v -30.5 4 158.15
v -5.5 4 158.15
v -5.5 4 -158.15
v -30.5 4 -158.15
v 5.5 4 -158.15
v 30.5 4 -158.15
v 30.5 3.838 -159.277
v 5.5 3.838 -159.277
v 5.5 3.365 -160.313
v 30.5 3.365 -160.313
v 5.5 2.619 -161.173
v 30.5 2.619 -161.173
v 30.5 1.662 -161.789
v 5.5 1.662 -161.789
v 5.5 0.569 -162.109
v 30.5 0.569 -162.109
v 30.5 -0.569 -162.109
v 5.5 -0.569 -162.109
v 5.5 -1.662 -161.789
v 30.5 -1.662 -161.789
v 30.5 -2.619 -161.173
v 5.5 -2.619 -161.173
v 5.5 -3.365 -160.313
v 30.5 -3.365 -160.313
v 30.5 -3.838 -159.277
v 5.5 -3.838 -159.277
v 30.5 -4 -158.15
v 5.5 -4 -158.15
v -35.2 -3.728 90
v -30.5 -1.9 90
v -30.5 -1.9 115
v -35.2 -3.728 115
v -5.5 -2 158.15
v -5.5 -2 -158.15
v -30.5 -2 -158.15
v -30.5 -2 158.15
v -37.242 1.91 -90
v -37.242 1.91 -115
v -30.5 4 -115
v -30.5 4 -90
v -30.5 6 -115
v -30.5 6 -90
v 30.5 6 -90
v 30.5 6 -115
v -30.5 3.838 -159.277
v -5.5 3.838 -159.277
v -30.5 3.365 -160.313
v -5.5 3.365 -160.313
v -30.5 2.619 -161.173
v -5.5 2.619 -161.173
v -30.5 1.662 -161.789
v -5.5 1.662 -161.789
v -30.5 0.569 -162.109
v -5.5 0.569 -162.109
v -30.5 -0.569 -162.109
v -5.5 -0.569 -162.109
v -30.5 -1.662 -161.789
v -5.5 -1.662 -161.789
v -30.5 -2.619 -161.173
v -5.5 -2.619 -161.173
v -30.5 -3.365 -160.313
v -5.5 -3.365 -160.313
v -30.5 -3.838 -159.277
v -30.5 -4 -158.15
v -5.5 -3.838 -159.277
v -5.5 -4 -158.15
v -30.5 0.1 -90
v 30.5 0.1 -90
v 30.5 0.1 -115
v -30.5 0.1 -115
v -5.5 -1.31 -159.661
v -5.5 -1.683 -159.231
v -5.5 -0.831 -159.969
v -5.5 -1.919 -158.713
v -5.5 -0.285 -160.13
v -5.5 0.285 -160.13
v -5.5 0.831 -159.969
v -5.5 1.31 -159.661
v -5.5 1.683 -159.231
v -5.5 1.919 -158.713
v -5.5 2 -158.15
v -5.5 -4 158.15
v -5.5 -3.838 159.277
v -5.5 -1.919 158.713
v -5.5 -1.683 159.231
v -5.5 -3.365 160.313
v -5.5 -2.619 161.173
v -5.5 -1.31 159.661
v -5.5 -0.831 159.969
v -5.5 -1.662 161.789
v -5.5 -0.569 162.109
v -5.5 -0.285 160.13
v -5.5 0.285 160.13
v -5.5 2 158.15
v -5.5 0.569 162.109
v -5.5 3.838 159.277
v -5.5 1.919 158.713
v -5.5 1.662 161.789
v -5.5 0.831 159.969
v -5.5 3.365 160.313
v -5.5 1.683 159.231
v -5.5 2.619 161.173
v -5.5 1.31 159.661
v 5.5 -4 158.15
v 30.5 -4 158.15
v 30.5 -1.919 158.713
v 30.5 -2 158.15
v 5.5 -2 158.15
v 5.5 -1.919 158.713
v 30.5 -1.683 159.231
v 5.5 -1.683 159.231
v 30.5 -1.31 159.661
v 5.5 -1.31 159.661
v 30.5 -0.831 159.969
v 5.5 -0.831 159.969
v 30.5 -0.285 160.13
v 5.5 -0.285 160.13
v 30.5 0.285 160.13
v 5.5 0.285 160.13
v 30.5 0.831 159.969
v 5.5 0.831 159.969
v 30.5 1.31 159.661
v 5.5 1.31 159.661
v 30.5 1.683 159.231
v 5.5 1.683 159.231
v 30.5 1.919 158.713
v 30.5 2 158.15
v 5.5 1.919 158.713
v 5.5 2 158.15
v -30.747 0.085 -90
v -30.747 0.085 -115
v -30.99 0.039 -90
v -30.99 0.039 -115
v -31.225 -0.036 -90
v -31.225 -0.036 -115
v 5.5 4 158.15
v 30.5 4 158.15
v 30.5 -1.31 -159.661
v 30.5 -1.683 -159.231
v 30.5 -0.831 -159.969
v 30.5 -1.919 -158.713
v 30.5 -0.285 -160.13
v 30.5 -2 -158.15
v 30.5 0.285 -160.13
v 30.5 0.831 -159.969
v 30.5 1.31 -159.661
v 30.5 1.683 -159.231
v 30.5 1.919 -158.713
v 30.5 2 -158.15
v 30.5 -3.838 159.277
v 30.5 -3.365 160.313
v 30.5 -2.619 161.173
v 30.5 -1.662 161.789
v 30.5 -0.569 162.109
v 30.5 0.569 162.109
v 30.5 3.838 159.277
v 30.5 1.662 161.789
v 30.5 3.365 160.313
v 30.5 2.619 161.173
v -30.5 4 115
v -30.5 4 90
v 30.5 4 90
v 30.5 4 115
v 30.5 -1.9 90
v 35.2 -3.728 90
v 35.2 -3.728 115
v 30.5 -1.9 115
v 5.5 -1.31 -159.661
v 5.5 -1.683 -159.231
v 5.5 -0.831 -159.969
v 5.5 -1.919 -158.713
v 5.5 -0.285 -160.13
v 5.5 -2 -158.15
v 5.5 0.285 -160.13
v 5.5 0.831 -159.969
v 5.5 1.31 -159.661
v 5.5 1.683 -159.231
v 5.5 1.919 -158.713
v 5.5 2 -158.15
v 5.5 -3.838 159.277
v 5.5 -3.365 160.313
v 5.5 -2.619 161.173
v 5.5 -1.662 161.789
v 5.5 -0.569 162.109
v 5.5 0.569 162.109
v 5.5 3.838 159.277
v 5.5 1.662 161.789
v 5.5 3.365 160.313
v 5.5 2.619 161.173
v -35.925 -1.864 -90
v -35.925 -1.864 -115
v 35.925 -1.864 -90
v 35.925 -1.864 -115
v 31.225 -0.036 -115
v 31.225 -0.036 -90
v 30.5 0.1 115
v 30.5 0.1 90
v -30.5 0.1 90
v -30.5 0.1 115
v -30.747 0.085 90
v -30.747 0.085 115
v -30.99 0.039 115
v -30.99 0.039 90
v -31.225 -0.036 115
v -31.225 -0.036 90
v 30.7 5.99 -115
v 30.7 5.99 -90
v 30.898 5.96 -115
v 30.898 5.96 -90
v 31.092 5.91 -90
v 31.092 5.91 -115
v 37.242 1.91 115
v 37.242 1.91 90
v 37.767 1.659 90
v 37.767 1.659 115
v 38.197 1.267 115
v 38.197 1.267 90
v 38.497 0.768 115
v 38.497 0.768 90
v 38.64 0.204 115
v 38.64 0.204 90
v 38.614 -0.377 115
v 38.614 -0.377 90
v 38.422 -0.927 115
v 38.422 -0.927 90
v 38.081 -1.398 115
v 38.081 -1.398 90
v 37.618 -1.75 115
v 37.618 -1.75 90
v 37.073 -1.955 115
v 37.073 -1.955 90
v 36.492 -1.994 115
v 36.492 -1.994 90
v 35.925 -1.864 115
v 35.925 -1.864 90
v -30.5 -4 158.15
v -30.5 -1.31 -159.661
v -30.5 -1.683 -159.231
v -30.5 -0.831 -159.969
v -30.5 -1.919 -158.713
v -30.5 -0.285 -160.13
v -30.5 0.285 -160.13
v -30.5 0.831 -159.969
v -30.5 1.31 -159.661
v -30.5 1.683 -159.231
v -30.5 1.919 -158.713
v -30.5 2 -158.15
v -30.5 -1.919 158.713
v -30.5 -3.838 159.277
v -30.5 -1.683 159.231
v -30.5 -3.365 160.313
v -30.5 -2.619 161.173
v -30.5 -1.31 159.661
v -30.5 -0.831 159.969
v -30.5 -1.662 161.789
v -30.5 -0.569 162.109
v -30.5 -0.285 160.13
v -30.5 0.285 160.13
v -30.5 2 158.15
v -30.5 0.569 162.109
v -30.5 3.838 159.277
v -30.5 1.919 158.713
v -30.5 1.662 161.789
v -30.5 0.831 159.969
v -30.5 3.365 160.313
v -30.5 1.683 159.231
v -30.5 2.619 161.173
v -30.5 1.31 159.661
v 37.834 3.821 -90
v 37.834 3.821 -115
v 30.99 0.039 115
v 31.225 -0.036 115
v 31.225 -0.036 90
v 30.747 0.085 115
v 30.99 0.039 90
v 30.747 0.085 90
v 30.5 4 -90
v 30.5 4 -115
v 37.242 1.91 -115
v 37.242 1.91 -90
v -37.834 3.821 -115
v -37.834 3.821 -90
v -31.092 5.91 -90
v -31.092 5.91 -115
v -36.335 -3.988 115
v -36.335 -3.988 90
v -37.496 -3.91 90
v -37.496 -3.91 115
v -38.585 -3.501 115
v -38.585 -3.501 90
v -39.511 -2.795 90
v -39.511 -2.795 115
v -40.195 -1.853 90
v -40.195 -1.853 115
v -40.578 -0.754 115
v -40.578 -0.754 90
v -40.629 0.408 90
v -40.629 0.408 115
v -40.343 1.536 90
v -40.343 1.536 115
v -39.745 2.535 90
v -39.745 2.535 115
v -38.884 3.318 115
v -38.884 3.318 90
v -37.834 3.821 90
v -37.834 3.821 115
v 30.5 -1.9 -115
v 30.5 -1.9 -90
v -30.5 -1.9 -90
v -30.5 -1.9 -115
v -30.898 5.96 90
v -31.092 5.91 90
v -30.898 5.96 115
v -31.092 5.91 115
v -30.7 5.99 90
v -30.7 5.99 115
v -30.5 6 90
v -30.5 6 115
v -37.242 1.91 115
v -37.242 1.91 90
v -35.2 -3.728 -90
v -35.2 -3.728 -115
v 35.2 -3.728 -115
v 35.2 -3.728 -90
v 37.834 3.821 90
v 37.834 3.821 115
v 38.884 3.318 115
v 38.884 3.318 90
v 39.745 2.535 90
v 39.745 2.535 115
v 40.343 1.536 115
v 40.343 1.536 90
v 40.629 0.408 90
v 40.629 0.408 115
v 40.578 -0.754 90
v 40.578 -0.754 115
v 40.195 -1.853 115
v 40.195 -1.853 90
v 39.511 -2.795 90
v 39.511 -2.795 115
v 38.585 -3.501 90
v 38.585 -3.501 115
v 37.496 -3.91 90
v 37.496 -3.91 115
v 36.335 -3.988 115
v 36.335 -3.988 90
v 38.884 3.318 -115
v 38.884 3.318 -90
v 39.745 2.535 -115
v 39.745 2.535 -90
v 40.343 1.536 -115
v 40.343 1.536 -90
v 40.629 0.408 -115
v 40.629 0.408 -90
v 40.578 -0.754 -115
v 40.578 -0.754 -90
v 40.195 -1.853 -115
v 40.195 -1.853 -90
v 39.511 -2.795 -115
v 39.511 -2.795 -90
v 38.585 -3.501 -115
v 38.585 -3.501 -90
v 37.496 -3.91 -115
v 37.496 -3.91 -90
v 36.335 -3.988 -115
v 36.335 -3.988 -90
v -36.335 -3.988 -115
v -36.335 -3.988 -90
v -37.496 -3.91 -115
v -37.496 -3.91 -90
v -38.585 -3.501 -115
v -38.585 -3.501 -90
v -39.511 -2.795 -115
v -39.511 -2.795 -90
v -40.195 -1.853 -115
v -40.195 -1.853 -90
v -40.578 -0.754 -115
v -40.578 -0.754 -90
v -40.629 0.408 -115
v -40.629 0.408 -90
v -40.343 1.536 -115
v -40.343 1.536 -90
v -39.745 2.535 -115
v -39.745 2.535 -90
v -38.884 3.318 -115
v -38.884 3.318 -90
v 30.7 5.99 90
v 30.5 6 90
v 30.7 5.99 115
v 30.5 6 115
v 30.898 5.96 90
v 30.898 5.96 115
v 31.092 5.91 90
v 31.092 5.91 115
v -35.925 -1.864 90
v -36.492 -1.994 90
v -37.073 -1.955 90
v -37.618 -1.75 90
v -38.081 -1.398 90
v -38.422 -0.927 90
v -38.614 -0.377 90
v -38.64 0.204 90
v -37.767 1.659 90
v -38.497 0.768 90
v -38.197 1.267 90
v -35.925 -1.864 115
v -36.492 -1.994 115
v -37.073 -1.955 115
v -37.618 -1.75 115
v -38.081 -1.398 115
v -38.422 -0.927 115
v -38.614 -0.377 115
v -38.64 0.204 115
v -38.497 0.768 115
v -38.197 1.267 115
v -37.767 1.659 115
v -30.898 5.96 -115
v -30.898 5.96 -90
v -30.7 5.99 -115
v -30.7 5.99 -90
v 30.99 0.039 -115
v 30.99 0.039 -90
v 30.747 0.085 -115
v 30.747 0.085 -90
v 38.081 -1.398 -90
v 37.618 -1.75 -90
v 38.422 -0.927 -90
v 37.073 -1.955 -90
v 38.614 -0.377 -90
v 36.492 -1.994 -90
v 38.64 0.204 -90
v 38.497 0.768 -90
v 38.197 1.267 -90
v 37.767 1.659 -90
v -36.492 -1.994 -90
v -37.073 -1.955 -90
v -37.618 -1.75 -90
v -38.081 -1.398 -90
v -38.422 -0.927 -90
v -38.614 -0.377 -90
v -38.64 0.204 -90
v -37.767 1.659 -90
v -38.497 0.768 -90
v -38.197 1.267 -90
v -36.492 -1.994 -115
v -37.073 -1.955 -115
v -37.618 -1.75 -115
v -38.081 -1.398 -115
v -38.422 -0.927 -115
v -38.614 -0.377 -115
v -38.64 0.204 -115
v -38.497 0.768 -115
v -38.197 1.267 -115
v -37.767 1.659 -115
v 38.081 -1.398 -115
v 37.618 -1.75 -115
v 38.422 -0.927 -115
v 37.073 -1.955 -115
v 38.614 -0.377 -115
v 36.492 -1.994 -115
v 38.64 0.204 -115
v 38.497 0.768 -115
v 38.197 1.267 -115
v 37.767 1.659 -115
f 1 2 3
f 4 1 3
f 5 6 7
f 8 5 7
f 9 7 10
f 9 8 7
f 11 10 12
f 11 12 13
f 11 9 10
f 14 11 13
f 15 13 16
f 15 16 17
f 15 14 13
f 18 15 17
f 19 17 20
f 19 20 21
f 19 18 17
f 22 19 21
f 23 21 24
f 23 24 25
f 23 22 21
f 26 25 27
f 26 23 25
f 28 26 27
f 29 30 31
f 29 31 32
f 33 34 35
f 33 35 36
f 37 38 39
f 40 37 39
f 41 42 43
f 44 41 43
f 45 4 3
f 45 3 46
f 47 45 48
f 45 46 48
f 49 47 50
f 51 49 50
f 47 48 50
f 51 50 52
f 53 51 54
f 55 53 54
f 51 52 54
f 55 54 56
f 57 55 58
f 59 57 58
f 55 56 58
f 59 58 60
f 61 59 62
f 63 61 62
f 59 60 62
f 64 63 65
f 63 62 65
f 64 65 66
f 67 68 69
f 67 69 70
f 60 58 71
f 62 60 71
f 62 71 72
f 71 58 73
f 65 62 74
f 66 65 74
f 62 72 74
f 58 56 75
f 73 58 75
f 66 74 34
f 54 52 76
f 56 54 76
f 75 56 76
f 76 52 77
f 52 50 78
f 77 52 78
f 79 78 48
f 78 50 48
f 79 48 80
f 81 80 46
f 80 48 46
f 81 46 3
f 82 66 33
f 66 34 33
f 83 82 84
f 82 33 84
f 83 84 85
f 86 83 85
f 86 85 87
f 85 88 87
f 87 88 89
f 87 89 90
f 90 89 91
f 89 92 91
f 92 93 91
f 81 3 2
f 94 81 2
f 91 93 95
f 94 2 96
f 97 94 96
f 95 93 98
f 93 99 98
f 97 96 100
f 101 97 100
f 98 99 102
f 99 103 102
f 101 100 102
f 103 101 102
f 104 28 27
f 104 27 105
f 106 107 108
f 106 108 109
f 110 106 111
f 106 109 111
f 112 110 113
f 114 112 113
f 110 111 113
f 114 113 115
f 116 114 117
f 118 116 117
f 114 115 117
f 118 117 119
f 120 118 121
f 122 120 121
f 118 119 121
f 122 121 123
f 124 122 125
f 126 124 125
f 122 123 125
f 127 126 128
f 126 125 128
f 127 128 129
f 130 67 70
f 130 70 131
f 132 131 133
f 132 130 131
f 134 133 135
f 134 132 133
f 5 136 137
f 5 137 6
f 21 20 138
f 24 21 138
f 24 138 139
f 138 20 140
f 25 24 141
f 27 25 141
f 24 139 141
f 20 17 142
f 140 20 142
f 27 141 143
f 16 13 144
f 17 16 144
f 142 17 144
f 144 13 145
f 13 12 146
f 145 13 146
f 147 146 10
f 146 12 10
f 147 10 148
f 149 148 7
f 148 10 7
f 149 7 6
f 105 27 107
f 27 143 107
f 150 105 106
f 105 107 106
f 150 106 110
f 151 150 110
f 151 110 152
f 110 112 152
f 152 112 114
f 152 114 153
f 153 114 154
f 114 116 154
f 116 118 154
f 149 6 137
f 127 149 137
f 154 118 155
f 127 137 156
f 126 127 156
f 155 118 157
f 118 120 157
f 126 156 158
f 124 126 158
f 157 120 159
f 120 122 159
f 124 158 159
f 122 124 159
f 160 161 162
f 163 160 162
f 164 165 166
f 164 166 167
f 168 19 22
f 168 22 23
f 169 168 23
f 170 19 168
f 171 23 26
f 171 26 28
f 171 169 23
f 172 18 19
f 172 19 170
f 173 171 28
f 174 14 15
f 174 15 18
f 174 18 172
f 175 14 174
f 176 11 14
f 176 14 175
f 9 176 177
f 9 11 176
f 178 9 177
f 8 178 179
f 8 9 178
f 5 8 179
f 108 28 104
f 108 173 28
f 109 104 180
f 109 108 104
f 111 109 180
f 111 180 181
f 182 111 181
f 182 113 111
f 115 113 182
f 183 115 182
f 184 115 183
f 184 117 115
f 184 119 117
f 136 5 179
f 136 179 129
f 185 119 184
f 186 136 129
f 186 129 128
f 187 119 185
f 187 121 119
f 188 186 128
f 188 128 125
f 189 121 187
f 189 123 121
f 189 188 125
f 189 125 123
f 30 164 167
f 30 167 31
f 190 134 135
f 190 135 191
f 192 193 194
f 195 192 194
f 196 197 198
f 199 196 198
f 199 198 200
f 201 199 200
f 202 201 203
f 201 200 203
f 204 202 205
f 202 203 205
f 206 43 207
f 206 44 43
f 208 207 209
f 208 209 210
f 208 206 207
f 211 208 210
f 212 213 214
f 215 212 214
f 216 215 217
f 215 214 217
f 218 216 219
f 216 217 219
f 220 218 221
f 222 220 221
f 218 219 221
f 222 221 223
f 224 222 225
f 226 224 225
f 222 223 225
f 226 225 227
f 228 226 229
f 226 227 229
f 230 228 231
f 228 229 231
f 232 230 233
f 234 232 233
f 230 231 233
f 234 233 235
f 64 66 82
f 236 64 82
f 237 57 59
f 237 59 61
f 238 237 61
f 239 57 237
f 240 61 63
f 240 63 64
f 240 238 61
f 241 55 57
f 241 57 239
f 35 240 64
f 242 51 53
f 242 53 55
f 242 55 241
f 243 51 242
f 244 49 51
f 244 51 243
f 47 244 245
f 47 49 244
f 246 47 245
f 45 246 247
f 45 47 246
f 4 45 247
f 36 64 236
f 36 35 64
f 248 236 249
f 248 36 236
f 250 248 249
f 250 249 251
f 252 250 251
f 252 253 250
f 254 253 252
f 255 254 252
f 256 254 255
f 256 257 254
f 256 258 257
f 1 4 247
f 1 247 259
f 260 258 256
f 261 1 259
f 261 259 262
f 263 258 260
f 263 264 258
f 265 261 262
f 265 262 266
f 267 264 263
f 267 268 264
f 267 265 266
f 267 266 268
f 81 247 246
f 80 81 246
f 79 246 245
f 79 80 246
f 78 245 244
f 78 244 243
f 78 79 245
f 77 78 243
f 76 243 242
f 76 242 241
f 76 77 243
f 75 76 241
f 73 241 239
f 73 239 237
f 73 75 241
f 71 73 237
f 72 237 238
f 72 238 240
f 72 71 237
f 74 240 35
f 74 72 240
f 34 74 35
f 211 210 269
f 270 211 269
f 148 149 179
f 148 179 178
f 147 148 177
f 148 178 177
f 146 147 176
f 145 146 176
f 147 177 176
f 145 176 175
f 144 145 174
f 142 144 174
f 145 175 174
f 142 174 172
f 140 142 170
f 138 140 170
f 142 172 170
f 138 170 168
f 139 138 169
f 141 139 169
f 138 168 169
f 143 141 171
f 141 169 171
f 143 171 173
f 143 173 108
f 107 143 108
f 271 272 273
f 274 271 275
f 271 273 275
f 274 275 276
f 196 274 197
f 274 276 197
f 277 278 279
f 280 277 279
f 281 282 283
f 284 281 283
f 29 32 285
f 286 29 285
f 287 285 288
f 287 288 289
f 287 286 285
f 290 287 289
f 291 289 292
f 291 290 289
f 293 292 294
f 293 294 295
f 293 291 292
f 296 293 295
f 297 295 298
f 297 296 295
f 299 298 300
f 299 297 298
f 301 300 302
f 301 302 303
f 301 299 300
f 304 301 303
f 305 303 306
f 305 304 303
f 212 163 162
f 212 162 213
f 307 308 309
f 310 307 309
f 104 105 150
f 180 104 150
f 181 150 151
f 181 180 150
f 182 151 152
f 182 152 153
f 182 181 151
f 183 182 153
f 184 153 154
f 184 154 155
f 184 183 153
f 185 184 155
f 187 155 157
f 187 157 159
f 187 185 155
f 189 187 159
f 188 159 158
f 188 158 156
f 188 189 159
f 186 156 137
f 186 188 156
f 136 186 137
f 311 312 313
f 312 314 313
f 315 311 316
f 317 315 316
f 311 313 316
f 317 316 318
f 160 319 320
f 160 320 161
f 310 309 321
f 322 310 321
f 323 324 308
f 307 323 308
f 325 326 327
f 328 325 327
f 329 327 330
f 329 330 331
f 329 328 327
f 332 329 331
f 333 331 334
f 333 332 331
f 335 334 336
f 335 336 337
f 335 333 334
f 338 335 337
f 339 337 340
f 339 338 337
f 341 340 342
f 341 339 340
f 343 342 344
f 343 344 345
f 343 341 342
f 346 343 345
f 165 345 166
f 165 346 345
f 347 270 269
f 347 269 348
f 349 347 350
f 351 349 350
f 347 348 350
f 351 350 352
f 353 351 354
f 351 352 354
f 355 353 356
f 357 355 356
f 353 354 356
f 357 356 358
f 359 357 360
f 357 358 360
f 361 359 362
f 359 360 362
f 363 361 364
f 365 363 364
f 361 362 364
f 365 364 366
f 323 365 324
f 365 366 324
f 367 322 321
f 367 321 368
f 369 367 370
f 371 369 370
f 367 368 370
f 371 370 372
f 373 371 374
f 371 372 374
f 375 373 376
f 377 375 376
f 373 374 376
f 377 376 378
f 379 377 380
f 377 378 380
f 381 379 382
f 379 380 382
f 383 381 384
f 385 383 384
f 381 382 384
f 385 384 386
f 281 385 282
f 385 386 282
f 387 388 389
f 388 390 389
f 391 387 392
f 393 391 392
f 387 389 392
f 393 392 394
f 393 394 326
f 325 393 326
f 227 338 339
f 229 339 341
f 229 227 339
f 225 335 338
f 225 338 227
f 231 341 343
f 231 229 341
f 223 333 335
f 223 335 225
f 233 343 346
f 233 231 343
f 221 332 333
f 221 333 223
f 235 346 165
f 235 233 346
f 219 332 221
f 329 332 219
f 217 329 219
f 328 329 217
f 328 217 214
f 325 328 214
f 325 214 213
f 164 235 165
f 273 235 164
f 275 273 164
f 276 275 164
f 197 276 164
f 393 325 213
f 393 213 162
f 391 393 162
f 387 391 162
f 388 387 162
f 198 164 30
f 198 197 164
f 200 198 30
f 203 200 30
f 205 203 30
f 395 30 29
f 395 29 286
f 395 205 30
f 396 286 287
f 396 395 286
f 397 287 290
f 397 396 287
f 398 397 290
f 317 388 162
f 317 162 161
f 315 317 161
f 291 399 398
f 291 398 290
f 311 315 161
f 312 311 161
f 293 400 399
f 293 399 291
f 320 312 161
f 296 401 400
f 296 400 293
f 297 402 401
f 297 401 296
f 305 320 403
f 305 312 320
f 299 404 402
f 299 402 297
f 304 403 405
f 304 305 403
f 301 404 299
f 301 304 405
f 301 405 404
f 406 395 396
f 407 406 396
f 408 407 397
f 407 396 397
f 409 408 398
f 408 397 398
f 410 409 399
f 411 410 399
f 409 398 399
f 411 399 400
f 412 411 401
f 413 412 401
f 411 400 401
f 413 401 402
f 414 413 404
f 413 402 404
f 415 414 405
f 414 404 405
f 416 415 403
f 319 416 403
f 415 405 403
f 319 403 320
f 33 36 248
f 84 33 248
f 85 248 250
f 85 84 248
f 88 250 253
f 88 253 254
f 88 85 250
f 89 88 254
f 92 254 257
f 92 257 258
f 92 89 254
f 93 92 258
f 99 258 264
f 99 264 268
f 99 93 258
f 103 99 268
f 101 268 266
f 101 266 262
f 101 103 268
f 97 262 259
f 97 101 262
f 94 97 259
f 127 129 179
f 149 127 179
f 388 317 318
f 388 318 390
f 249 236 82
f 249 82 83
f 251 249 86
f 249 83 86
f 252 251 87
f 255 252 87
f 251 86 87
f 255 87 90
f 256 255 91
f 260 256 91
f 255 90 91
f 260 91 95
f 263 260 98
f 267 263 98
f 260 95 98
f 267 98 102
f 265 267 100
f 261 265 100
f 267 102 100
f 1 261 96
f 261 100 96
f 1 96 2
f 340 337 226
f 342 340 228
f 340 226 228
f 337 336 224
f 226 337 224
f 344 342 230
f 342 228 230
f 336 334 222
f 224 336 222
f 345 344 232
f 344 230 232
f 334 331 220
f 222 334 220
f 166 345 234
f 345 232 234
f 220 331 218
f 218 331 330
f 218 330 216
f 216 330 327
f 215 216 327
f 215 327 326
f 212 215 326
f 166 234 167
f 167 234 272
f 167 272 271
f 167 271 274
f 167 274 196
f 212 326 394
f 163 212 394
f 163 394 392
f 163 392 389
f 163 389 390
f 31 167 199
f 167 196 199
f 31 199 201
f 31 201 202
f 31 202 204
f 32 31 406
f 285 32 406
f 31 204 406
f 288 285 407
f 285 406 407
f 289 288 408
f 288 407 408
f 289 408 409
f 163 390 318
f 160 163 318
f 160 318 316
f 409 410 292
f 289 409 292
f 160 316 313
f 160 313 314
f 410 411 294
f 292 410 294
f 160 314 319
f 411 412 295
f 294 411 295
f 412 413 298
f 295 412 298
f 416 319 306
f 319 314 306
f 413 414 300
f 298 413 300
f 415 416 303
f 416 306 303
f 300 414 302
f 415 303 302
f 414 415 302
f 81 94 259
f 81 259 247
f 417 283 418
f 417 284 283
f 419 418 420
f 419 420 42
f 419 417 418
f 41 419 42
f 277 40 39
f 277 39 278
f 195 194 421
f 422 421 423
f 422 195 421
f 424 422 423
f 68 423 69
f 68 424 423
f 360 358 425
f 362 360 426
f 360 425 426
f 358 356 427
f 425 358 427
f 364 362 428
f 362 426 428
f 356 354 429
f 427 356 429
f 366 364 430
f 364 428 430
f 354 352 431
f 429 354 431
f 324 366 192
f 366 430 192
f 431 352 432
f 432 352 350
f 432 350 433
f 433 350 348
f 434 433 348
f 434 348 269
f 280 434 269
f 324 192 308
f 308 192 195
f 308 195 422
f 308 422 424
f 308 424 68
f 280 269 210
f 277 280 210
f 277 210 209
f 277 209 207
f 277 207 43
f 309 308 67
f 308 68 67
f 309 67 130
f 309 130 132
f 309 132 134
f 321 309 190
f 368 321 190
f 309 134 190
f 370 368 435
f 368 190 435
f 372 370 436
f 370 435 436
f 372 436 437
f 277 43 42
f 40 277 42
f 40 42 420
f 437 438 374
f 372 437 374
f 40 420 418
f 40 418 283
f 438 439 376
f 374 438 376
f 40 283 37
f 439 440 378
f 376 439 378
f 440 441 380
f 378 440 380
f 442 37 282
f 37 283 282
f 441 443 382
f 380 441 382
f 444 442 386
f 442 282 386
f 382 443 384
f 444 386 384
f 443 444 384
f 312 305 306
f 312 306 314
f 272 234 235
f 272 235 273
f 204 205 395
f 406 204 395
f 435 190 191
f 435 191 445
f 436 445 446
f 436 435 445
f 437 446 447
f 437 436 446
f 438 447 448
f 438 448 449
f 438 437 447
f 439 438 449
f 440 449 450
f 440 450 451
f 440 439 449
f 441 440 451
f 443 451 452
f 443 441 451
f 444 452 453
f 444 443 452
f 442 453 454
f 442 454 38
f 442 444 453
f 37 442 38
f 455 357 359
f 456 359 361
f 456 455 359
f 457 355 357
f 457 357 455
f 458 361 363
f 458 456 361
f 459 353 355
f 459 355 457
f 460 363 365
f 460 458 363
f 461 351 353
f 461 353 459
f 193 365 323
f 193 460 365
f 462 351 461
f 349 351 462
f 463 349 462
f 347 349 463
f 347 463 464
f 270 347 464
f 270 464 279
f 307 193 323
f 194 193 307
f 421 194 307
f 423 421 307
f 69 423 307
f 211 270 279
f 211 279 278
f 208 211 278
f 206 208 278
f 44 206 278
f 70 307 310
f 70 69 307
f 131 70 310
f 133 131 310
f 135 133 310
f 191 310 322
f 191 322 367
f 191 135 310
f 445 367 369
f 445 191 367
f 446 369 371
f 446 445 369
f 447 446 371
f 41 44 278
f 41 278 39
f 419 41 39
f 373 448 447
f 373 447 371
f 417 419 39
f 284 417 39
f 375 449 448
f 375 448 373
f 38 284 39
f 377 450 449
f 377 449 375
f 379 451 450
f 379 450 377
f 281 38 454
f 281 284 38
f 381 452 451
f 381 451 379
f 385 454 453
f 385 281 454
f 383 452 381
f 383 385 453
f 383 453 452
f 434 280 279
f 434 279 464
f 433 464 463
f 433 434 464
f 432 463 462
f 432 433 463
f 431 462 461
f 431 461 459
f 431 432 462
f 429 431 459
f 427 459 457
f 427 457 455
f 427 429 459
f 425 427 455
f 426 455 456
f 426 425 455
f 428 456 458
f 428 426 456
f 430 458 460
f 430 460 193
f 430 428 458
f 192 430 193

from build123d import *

# Parameters (mm, degrees)
EXTRUDE_THIN1_START = 5.5
EXTRUDE_THIN1_DEPTH = 25
EXTRUDE_THIN2_START = 90
EXTRUDE_THIN2_DEPTH = 25
FILLET1_R           = 2


with BuildPart() as part:
    # Sketch1 → Extrude-Thin1 (new body)
    with BuildSketch(Plane(origin=(0, 0, 0), x_dir=(0, 0, -1), z_dir=(1, 0, 0)).offset(EXTRUDE_THIN1_START)):
        with BuildLine():
            Line((158.15, -4), (-158.15, -4))
            ThreePointArc((-158.15, -4), (-162.15, 0), (-158.15, 4))
            Line((-158.15, 4), (158.15, 4))
            ThreePointArc((158.15, 4), (162.15, 0), (158.15, -4))
        make_face()
        with BuildLine():
            Line((158.15, -2), (-158.15, -2))
            ThreePointArc((-158.15, -2), (-160.15, 0), (-158.15, 2))
            Line((-158.15, 2), (158.15, 2))
            ThreePointArc((158.15, 2), (160.15, 0), (158.15, -2))
        make_face(mode=Mode.SUBTRACT)
    extrude(amount=EXTRUDE_THIN1_DEPTH)


with BuildPart() as body_2:
    # Mirror3: mirrored copy
    add(part.part.mirror(Plane(origin=(0, 0, 0), x_dir=(0, 0, 1), z_dir=(1, 0, 0))))


with BuildPart() as body_3:
    # Sketch3 → Extrude-Thin2 (new body)
    with BuildSketch(Plane.XY.offset(EXTRUDE_THIN2_START)):
        with BuildLine():
            Line((-37.834190406, 3.820692749), (-30.802835169, 6))
            Line((-30.802835169, 6), (30.802835169, 6))
            Line((30.802835169, 6), (37.834190406, 3.820692749))
            ThreePointArc((37.834190406, 3.820692749), (40.426672016, -1.317857536), (35.200106572, -3.727976535))
            Line((35.200106572, -3.727976535), (30.5, -1.9))
            Line((30.5, -1.9), (-30.5, -1.9))
            Line((-30.5, -1.9), (-35.200106572, -3.727976535))
            ThreePointArc((-35.200106572, -3.727976535), (-40.426672016, -1.317857536), (-37.834190406, 3.820692749))
        make_face()
        with BuildLine():
            Line((-37.242095203, 1.910346375), (-30.5, 4))
            Line((-30.5, 4), (30.5, 4))
            Line((30.5, 4), (37.242095203, 1.910346375))
            ThreePointArc((37.242095203, 1.910346375), (38.538336008, -0.658928768), (35.925053286, -1.863988268))
            Line((35.925053286, -1.863988268), (31.224946714, -0.036011732))
            ThreePointArc((31.224946714, -0.036011732), (30.868797685, 0.065702996), (30.5, 0.1))
            Line((30.5, 0.1), (-30.5, 0.1))
            ThreePointArc((-30.5, 0.1), (-30.868797685, 0.065702996), (-31.224946714, -0.036011732))
            Line((-31.224946714, -0.036011732), (-35.925053286, -1.863988268))
            ThreePointArc((-35.925053286, -1.863988268), (-38.538336008, -0.658928768), (-37.242095203, 1.910346375))
        make_face(mode=Mode.SUBTRACT)
    extrude(amount=EXTRUDE_THIN2_DEPTH)

    # Fillet1
    fillet1_edges = [body_3.edges().sort_by_distance(p)[0] for p in [
        (-30.802835169, 6, 102.5),
        (30.802835169, 6, 102.5),
    ]]
    fillet(fillet1_edges, radius=FILLET1_R)


with BuildPart() as body_4:
    # Mirror4: mirrored copy
    add(body_3.part.mirror(Plane.XY))


solid = Compound([part.part, body_2.part, body_3.part, body_4.part])
